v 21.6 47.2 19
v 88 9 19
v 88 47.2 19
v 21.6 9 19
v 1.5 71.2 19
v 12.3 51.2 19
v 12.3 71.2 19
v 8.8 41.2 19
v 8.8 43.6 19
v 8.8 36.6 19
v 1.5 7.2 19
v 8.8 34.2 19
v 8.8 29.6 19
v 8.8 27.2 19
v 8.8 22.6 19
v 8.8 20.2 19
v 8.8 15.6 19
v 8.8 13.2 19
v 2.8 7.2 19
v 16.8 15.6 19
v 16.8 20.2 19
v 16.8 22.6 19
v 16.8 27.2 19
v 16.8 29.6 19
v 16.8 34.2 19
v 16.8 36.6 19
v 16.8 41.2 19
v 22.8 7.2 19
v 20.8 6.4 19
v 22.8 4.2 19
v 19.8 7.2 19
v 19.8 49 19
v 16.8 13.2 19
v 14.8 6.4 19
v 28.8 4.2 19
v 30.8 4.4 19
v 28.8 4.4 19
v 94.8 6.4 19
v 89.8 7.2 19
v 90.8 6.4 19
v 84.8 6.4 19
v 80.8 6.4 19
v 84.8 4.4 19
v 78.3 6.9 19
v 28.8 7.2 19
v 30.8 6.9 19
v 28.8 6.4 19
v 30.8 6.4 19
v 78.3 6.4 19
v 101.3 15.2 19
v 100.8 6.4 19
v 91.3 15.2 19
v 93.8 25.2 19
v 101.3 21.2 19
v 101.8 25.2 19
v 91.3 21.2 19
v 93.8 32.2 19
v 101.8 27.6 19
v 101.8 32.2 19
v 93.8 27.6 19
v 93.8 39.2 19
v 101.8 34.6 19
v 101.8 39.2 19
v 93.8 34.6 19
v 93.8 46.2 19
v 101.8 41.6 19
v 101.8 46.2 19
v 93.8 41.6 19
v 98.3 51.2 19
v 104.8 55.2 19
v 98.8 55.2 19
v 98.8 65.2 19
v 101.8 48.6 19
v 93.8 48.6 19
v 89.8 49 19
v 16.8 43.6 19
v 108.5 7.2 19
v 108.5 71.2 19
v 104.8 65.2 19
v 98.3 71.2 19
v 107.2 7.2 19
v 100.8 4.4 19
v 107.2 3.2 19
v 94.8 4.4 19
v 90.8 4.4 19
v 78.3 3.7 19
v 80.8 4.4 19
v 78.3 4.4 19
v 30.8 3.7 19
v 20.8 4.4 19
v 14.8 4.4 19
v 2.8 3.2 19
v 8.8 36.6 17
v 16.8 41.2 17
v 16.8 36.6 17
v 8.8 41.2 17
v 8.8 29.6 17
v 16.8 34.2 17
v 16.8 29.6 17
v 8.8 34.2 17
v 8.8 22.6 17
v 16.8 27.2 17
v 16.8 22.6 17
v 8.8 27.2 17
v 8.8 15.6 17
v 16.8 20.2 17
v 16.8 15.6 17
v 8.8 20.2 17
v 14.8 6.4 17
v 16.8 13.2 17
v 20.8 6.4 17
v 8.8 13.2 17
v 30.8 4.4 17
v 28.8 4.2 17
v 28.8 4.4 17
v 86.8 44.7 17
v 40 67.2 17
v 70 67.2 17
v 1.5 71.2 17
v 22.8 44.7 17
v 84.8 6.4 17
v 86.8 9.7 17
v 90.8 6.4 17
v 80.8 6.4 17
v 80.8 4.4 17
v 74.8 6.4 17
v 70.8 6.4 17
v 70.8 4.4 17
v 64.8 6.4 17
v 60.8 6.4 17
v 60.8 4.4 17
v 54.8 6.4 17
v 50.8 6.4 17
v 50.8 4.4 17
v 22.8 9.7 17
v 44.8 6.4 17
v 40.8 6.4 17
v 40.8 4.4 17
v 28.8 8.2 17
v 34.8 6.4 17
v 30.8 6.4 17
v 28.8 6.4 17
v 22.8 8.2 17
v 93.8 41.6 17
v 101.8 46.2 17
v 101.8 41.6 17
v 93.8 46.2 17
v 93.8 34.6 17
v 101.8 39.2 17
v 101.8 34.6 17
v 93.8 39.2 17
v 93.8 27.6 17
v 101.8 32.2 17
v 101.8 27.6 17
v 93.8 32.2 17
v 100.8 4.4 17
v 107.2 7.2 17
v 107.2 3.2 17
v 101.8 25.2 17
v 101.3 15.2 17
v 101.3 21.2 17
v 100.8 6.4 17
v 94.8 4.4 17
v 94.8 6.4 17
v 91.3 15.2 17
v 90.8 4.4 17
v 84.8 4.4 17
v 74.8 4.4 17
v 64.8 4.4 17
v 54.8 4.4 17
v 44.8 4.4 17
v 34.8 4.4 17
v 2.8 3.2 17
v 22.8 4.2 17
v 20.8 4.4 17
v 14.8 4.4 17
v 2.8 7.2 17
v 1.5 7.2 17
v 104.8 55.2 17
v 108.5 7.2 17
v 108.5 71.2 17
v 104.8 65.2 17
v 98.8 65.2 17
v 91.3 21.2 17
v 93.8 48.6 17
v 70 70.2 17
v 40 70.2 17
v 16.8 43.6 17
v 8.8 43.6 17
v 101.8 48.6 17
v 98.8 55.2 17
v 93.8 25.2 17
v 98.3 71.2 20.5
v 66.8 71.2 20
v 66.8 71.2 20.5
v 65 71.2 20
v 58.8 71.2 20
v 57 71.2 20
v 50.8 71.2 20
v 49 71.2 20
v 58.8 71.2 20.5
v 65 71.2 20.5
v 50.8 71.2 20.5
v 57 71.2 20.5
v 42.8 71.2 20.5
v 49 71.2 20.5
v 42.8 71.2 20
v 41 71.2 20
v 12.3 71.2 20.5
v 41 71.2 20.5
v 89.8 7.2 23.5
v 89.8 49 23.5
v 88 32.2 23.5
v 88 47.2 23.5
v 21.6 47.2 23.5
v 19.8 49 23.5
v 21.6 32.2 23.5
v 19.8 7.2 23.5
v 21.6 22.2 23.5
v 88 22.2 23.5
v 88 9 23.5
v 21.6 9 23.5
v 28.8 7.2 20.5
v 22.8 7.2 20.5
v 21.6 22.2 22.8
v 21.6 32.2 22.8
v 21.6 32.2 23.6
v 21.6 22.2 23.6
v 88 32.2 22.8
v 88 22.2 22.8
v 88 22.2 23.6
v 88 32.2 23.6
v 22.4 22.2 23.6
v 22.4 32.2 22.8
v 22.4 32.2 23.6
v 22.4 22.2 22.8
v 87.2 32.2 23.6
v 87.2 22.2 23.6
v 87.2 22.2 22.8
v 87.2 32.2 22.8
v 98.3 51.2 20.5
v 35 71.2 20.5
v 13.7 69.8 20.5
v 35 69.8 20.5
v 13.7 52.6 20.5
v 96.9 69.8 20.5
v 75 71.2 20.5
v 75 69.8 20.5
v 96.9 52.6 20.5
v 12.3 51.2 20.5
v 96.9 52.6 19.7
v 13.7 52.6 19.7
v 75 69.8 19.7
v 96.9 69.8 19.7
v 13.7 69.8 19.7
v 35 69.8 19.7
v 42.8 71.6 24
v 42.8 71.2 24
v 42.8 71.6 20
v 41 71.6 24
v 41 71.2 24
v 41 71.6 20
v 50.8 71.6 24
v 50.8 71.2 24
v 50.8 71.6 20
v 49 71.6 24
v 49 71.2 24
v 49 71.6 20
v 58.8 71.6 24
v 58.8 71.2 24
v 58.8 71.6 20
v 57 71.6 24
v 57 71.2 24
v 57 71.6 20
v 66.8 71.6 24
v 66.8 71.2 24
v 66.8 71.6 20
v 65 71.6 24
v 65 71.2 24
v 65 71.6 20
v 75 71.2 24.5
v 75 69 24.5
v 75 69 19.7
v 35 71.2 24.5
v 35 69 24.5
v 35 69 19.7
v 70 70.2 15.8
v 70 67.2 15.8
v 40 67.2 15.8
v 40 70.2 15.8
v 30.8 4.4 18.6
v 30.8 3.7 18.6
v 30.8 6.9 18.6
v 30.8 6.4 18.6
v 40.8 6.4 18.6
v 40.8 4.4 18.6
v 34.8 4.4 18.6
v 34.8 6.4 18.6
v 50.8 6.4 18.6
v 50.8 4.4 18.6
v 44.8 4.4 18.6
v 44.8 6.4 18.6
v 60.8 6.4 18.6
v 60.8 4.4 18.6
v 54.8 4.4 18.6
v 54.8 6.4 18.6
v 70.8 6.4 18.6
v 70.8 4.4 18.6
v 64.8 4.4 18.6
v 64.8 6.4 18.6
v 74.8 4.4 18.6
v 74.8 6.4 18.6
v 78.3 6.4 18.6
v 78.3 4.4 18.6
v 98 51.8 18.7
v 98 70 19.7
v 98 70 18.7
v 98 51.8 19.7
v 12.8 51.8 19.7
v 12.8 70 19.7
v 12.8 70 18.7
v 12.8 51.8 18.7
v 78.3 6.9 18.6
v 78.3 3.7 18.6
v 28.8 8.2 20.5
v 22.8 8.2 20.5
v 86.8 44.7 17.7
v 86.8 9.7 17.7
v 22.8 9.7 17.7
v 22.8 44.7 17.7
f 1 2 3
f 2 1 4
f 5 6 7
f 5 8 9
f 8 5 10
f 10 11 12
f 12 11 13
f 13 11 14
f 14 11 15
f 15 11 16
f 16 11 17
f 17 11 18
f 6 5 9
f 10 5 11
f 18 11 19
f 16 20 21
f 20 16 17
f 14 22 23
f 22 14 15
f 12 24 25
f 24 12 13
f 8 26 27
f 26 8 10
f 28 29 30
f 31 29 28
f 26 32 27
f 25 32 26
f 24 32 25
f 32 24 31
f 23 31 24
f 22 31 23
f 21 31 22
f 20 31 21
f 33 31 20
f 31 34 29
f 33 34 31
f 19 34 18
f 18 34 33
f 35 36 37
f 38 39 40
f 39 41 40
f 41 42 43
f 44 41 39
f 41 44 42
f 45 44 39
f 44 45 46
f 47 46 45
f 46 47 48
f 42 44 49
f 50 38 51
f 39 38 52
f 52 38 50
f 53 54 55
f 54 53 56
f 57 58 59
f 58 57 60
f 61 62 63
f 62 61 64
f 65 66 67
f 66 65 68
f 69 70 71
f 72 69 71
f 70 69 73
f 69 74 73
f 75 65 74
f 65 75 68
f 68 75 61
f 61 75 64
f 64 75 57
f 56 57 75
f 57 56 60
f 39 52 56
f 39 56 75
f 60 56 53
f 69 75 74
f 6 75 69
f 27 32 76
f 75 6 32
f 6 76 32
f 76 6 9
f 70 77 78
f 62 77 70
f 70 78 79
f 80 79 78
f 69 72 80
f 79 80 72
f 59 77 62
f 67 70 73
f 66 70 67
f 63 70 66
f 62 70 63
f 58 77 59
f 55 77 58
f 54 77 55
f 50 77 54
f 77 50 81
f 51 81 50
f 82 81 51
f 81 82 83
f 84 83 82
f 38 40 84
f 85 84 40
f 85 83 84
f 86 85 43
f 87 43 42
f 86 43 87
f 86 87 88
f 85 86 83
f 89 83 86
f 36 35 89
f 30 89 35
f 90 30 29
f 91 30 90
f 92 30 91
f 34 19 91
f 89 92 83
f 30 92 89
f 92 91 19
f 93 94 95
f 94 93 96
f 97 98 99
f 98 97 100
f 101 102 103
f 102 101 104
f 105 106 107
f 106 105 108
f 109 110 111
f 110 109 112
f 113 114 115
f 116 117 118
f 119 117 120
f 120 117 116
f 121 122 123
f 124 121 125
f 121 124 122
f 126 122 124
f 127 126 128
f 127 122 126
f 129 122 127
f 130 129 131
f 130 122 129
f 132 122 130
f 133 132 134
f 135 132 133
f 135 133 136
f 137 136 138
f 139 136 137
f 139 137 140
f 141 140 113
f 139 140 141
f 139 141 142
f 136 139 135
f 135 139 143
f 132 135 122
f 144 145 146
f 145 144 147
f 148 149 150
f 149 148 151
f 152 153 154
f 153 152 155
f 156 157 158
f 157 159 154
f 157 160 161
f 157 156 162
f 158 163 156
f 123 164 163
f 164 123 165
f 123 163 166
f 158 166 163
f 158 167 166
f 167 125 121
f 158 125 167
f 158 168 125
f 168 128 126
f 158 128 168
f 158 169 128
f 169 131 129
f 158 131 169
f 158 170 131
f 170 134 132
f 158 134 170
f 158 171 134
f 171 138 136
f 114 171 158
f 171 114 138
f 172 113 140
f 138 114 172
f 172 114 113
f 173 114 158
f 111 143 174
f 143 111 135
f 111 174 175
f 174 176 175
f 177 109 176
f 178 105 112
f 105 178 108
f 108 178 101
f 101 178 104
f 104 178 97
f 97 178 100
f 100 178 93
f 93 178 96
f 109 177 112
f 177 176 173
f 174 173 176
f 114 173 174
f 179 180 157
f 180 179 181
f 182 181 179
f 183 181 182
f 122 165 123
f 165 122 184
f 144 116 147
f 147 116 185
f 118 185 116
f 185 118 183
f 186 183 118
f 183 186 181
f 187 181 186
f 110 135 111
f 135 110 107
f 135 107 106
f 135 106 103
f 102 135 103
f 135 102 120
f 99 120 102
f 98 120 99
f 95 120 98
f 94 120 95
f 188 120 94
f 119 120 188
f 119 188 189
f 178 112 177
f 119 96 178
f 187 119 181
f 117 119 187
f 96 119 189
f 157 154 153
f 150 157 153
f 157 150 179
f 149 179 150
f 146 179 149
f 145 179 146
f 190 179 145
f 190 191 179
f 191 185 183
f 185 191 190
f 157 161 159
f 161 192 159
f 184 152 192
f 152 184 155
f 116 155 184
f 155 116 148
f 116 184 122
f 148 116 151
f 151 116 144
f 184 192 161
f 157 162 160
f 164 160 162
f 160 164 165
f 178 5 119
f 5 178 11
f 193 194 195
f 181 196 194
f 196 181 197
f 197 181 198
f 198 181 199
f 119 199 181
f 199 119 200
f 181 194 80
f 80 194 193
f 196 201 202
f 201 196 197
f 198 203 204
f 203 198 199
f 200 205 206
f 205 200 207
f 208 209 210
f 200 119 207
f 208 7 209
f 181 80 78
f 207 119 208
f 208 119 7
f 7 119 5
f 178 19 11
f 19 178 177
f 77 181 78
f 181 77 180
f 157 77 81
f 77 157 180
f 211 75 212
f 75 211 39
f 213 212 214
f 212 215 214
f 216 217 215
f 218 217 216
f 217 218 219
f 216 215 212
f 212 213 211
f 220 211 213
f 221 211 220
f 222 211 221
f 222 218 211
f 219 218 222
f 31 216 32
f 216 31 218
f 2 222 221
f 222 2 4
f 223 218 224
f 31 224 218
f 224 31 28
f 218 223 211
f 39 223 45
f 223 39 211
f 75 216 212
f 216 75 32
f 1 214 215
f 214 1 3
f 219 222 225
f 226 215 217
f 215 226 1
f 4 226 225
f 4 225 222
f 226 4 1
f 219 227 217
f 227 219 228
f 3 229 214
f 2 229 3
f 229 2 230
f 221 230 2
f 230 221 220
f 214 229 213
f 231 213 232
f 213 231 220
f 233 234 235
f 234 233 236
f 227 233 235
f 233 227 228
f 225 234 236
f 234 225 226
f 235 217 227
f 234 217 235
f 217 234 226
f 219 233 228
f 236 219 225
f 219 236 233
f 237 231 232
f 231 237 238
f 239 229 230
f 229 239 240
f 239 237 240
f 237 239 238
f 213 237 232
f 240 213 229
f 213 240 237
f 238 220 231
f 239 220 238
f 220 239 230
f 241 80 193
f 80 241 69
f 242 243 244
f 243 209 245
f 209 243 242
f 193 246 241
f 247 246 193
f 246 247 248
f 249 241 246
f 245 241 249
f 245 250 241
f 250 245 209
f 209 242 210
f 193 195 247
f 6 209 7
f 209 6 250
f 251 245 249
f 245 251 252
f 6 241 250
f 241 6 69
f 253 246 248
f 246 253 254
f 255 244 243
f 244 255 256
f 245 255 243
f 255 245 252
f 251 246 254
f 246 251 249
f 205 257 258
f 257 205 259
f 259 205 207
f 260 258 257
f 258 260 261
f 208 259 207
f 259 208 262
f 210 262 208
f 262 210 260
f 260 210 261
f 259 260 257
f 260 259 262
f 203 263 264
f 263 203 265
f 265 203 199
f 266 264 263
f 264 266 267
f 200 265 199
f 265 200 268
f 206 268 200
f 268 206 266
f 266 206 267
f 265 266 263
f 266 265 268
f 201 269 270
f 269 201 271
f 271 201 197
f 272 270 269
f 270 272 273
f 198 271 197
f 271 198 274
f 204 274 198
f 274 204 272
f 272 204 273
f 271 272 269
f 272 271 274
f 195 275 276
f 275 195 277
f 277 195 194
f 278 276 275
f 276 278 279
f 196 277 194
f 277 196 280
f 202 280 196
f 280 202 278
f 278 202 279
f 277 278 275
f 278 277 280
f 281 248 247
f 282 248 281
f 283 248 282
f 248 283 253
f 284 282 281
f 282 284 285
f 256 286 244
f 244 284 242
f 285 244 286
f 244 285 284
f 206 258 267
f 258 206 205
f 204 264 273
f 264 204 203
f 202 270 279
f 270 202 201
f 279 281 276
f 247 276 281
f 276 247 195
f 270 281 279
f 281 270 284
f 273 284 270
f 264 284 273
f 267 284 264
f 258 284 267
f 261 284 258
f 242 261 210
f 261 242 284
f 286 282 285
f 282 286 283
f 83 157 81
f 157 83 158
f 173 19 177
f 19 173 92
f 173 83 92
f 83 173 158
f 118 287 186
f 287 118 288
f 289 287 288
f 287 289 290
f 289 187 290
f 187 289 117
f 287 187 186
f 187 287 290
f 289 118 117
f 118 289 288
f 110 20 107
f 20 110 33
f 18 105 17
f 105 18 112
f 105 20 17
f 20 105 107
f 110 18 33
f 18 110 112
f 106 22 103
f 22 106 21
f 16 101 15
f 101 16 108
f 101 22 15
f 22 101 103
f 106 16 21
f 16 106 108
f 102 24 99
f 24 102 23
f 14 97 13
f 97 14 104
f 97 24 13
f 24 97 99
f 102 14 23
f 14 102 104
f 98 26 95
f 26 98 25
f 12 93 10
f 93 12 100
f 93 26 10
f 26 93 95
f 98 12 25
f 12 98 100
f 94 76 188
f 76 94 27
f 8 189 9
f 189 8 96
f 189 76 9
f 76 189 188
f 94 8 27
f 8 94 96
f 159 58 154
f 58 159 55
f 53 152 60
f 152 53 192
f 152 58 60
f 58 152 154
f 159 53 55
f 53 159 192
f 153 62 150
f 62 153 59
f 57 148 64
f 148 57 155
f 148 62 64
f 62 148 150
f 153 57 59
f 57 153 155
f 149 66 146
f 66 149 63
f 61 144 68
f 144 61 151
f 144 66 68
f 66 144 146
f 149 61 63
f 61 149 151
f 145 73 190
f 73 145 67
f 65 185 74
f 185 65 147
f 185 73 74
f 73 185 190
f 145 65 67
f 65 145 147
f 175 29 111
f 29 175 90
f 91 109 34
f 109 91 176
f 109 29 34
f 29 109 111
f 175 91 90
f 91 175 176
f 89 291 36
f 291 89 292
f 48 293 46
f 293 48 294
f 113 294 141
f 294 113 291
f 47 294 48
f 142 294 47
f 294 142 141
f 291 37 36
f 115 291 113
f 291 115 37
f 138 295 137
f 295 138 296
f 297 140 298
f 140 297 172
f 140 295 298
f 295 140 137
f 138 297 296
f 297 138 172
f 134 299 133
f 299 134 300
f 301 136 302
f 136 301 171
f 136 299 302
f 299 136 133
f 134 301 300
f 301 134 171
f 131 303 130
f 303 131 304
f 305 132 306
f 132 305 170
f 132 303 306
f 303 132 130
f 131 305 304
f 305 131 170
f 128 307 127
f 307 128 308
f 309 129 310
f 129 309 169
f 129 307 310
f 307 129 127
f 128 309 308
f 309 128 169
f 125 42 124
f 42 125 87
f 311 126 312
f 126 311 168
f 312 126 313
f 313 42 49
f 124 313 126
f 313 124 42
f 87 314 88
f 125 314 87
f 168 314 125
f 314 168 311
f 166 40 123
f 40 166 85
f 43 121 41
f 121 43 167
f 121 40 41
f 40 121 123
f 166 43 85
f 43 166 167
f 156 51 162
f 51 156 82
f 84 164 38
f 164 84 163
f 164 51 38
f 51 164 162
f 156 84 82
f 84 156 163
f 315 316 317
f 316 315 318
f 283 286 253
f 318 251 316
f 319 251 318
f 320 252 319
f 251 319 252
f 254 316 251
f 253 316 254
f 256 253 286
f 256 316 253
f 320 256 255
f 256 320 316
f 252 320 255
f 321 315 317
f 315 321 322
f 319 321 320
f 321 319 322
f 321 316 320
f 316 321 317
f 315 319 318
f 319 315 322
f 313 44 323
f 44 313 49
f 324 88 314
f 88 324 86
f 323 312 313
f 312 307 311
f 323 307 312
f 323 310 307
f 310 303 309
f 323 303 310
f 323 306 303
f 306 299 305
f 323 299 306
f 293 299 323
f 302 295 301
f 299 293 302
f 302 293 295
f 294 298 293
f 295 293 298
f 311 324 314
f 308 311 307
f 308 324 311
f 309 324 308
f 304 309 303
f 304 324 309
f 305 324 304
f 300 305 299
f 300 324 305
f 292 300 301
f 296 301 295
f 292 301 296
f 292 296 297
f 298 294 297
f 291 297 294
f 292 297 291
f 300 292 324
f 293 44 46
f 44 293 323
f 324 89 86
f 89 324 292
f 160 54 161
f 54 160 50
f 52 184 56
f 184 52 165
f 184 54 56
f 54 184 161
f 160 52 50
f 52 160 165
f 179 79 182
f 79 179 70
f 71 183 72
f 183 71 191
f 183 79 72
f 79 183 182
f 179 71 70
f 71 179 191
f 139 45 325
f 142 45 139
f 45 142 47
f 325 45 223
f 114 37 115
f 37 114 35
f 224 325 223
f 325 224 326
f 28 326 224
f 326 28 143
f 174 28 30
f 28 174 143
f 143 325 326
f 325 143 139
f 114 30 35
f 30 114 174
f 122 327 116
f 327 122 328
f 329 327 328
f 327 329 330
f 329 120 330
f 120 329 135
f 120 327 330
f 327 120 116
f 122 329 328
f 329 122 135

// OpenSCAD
// file: ../00_common/parameters.scad
// =============================================================================
// OpenMotorBridge - Global CAD Parameters & Settings
// =============================================================================
// File: hardware/cad/scad/00_common/parameters.scad
// Description: Global dimensional constants, manufacturing clearances and
//              circle resolution ($fn) for all OpenSCAD modules.
// =============================================================================

// --- 1. Circle & Curve Resolution ---
$fn = 60; // Smooth cylinders and holes for high-quality MJF 3D printing

// --- 2. Central Main Box Dimensions (v10 Dual-Rail Monocoque Slide-In Platform) ---
MAIN_BOX_OUTER_L      = 110.0; // Outer length in X (mm)
MAIN_BOX_OUTER_W      = 74.0;  // Outer width in Y (mm)
MAIN_BOX_TOTAL_H      = 38.0;  // Total height in Z (mm)
MAIN_BOX_LOWER_H      = 17.0;  // Reference lower deck height (mm)
MAIN_BOX_MID_H        = 15.0;  // Reference mid tray height (mm)
MAIN_BOX_LID_H        = 6.0;   // L-Slide lid top thickness (mm)
MAIN_BOX_WALL         = 2.5;   // Nominal wall thickness in PA12 (mm)
MAIN_BOX_CORNER_R     = 3.5;   // Vertical corner fillet radius (mm)

// Dual-Rail Slide-In Guide Heights:
MAIN_BOX_RAIL1_Z      = 18.0;  // Rail 1 center height: Slide-In Zwischenboden (mm)
MAIN_BOX_RAIL1_H      = 2.4;   // Rail 1 groove height (mm)
MAIN_BOX_RAIL1_DEPTH  = 1.5;   // Rail 1 groove depth in sidewall (mm)
MAIN_BOX_RAIL2_Z      = 33.0;  // Rail 2 center height: L-Slide Lid C-groove (mm)
MAIN_BOX_RAIL2_H      = 2.8;   // Rail 2 groove height (mm)
MAIN_BOX_RAIL2_DEPTH  = 1.8;   // Rail 2 groove depth in sidewall (mm)
MAIN_BOX_REAR_SILL_H  = 15.0;  // Fixed lower rear sill height (mm)

// --- 3. Satellite Pod Dimensions (Universal Enlarged Envelope) ---
POD_OUTER_L           = 150.0; // Outer length in X (mm, standardized for serial PCBA 03 + Cardo/Sena/OMM)
POD_OUTER_W           = 70.0;  // Outer width in Y (mm)
POD_OUTER_H           = 38.0;  // Outer height in Z (mm)
POD_WALL              = 3.5;   // Nominal wall thickness (mm)
POD_BULKHEAD_X        = 18.0;  // Partition bulkhead position in X (mm)
POD_CHAMBER_L         = 132.0; // Sliding chamber length in X (mm, clears 130mm sled + 2mm margin)
POD_CHAMBER_W         = 63.0;  // Sliding chamber width in Y (mm)
POD_CHAMBER_H         = 31.0;  // Sliding chamber height in Z (mm)

// --- 4. Pod Linear Guide Rails (Poka-Yoke Tongue & Groove) ---
POD_GROOVE_W          = 3.0;   // Internal guide groove width in Z (mm)
POD_GROOVE_DEPTH      = 1.5;   // Internal guide groove depth in Y (mm)
POD_GROOVE_LEFT_Z     = 10.0;  // Center height of left groove (mm)
POD_GROOVE_RIGHT_Z    = 18.0;  // Center height of right groove (mm, asym offset)

CARTRIDGE_TONGUE_W    = 2.6;   // Cartridge tongue rail height in Z (mm, 0.2mm clearance)
CARTRIDGE_TONGUE_PROT = 1.4;   // Cartridge tongue protrusion in Y (mm, 0.1mm clearance)
CARTRIDGE_CHAMFER_L   = 4.0;   // 30° lead-in chamfer nose length (mm)

// --- 5. Cartridge Dimensions (Enlarged Universal Sled) ---
CARTRIDGE_BASE_L      = 130.0; // Sled length in X (mm, accommodates PCBA 03 + OEM Cardo Air-Mount/Sena/OMM serial layout)
CARTRIDGE_BASE_W      = 58.0;  // Sled width in Y (mm)
CARTRIDGE_BASE_H      = 28.0;  // Sled height in Z (mm)
CARTRIDGE_FACE_L      = 4.0;   // Front faceplate thickness in X (mm)
CARTRIDGE_FACE_W      = 64.0;  // Front faceplate width in Y (mm)
CARTRIDGE_FACE_H      = 34.0;  // Front faceplate height in Z (mm)

// --- 5a. RF Interface & Sealing Dimensions ---
SMA_BORE_R            = 3.25;  // Ø 6.5 mm through-hole for standard SMA bulkhead
SMA_ORECESS_R         = 4.75;  // Ø 9.5 mm recess for waterproof silicone O-ring
SMA_ORECESS_DEPTH     = 1.2;   // 1.2 mm deep O-ring compression pocket

// --- 5b. Magnetic Anti-Theft Lock System ---
LATCH_PIVOT_X         = 65.0;  // Center pivot position along sled X (mm, centered on 130mm sled)
LATCH_MAGNET_X        = 53.0;  // Ferromagnetic anchor position along sled X (mm)
LATCH_TOOTH_X         = 77.0;  // Locking sawtooth pawl position along sled X (mm)
LATCH_ARM_H           = 6.0;   // Rocker lever height in Z (mm)
LATCH_ARM_THICK       = 2.6;   // Rocker beam thickness in Y (mm)
LATCH_MAGNET_PIN_DIA  = 6.2;   // Bore for Ø 6.0 mm steel dowel pin (mm)
LATCH_SPRING_DIA      = 3.8;   // Bore for Ø 3.5 mm return compression spring (mm)

// --- 6. Standard Captive Hex Nut Pockets (DIN 934 / DIN 985 with +0.2 mm MJF/FDM clearance) ---
NUT_M2_SW             = 4.2;   // M2 across flats (nominal 4.0 mm)
NUT_M2_H              = 1.8;   // M2 thickness (nominal 1.6 mm)
NUT_M2_5_SW           = 5.2;   // M2.5 across flats (nominal 5.0 mm)
NUT_M2_5_H            = 2.2;   // M2.5 thickness (nominal 2.0 mm)
NUT_M3_SW             = 5.7;   // M3 across flats (nominal 5.5 mm)
NUT_M3_H              = 2.6;   // M3 thickness (nominal 2.4 mm)
NUT_M4_SW             = 7.2;   // M4 across flats (nominal 7.0 mm)
NUT_M4_H              = 3.4;   // M4 thickness (nominal 3.2 mm)
NUT_M5_SW             = 8.2;   // M5 across flats (nominal 8.0 mm)
NUT_M5_H              = 4.2;   // M5 thickness (nominal 4.0 mm)

// Direct Plastic Thread-Forming / Self-Tapping Pilot Holes in PA12 (100% Soldering-Iron Free)
M2_PILOT_HOLE_R       = 0.85;  // Core hole for M2 screws in PA12 (Ø 1.7 mm)
M2_5_PILOT_HOLE_R     = 1.05;  // Core hole for M2.5 screws in PA12 (Ø 2.1 mm)
M3_PILOT_HOLE_R       = 1.25;  // Core hole for M3 screws in PA12 (Ø 2.5 mm)

// --- 7. Screw & Clearance Dimensions ---
M2_SCREW_HOLE_R       = 1.1;   // M2 clearance hole (r = 1.1 mm -> Ø 2.2 mm)
M2_5_SCREW_HOLE_R     = 1.4;   // M2.5 clearance hole (r = 1.4 mm -> Ø 2.8 mm)
M3_SCREW_HOLE_R       = 1.65;  // M3 clearance hole (r = 1.65 mm -> Ø 3.3 mm)
M4_SCREW_HOLE_R       = 2.2;   // M4 clearance hole (r = 2.2 mm -> Ø 4.4 mm)
M8_BORE_R             = 4.0;   // M8 cable through-bore (r = 4.0 mm -> Ø 8.0 mm)
M8_STUDS_OUTER_R      = 6.0;   // M8 neck outer radius (Ø 12.0 mm)

// --- 8. Universal Front Node Enclosure Dimensions (Type E: 98 x 68 x 25 mm) ---
FRONT_NODE_PCB_L      = 82.0;  // PCB length in X (mm, PCBA 05)
FRONT_NODE_PCB_W      = 50.0;  // PCB width in Y (mm, PCBA 05)
FRONT_NODE_PCB_H      = 1.6;   // PCB thickness in Z (mm)
FRONT_NODE_PCB_R      = 2.5;   // PCB corner radius (mm)

FRONT_NODE_CHAMBER_L  = 86.0;  // Internal chamber length in X (mm, 2mm margin per side)
FRONT_NODE_CHAMBER_W  = 56.0;  // Internal chamber width in Y (mm, 3mm margin per side)
FRONT_NODE_TUB_H      = 17.5;  // Lower tub depth in Z (mm)
FRONT_NODE_LID_H      = 7.5;   // Upper lid height in Z (mm)
FRONT_NODE_WALL       = 2.5;   // Wall thickness in HP MJF PA12 (mm)
FRONT_NODE_CORNER_R   = 4.0;   // Outer enclosure corner radius (mm)

FRONT_NODE_OUTER_L    = FRONT_NODE_CHAMBER_L + 2 * FRONT_NODE_WALL + 7.0; // 98.0 mm
FRONT_NODE_OUTER_W    = FRONT_NODE_CHAMBER_W + 2 * FRONT_NODE_WALL + 7.0; // 68.0 mm
FRONT_NODE_OUTER_H    = FRONT_NODE_TUB_H + FRONT_NODE_LID_H;              // 25.0 mm

// PCB Standoff Heights & Radii (100% Soldering-Iron Free)
FRONT_NODE_STANDOFF_H = 3.0;   // Height of PCB standoffs from floor (mm)
FRONT_NODE_STANDOFF_R = 3.0;   // Outer radius of M2.5 screw bosses (mm)
FRONT_NODE_CORE_HOLE_R= M2_5_PILOT_HOLE_R; // Core hole for direct M2.5 screw engagement (Ø 2.1 mm)

// AMPS 4-Hole Mounting Pattern (38 x 30 mm with DIN 934 M4 Captive Nut Pockets)
AMPS_SPACING_X        = 38.0;  // AMPS hole distance in X (mm)
AMPS_SPACING_Y        = 30.0;  // AMPS hole distance in Y (mm)
AMPS_NUT_SW           = NUT_M4_SW; // Captive M4 hex nut pocket across flats (7.2 mm)
AMPS_NUT_H            = NUT_M4_H;  // Captive M4 hex nut pocket depth (3.4 mm)

// Acoustic Vent for Knowles SPH0645 MEMS
FRONT_NODE_MIC_HOLE_R = 1.25;  // Sound canal radius (Ø 2.5 mm)
FRONT_NODE_MIC_MEMB_R = 3.0;   // Gore ePTFE membrane pocket radius (Ø 6.0 mm)
FRONT_NODE_MIC_MEMB_D = 0.8;   // Membrane pocket depth (mm)
// main file
// =============================================================================
// OpenMotorBridge - Central Main Box: Complete Slide-In Tray (v10.0)
// =============================================================================
// File: hardware/cad/scad/01_main_box/01_upper_deck.scad
// Description: Ready-to-print slide-in intermediate tray (Zwischenboden) for the
//              Central Box (Gehäuse Typ A) utilizing the v10 Dual-Rail Principle:
//              - Tool-free slide-in mounting on Rail 1 (Z = 18.0 mm).
//              - Integrated cradle for 1S LiPo backup battery (67 x 38 x 5 mm).
//              - Dedicated RF nests for Taoglas FXP895 (LoRa) & FXP73 (2.4 GHz).
//              - Thermal convection breathing slots for PCBA 01 buck converter.
//              - J7 battery lead and dual U.FL coaxial cable drop channels.
// =============================================================================

include <../00_common/parameters.scad>;
use <parts/010_slide_tray.scad>;

module main_box_mid_tray() {
    main_box_slide_tray(
        tray_l = 104.4,
        tray_w = 68.0,
        tray_t = 2.0,
        rail_z = MAIN_BOX_RAIL1_Z
    );
}

// Render complete slide-in tray
main_box_mid_tray();
